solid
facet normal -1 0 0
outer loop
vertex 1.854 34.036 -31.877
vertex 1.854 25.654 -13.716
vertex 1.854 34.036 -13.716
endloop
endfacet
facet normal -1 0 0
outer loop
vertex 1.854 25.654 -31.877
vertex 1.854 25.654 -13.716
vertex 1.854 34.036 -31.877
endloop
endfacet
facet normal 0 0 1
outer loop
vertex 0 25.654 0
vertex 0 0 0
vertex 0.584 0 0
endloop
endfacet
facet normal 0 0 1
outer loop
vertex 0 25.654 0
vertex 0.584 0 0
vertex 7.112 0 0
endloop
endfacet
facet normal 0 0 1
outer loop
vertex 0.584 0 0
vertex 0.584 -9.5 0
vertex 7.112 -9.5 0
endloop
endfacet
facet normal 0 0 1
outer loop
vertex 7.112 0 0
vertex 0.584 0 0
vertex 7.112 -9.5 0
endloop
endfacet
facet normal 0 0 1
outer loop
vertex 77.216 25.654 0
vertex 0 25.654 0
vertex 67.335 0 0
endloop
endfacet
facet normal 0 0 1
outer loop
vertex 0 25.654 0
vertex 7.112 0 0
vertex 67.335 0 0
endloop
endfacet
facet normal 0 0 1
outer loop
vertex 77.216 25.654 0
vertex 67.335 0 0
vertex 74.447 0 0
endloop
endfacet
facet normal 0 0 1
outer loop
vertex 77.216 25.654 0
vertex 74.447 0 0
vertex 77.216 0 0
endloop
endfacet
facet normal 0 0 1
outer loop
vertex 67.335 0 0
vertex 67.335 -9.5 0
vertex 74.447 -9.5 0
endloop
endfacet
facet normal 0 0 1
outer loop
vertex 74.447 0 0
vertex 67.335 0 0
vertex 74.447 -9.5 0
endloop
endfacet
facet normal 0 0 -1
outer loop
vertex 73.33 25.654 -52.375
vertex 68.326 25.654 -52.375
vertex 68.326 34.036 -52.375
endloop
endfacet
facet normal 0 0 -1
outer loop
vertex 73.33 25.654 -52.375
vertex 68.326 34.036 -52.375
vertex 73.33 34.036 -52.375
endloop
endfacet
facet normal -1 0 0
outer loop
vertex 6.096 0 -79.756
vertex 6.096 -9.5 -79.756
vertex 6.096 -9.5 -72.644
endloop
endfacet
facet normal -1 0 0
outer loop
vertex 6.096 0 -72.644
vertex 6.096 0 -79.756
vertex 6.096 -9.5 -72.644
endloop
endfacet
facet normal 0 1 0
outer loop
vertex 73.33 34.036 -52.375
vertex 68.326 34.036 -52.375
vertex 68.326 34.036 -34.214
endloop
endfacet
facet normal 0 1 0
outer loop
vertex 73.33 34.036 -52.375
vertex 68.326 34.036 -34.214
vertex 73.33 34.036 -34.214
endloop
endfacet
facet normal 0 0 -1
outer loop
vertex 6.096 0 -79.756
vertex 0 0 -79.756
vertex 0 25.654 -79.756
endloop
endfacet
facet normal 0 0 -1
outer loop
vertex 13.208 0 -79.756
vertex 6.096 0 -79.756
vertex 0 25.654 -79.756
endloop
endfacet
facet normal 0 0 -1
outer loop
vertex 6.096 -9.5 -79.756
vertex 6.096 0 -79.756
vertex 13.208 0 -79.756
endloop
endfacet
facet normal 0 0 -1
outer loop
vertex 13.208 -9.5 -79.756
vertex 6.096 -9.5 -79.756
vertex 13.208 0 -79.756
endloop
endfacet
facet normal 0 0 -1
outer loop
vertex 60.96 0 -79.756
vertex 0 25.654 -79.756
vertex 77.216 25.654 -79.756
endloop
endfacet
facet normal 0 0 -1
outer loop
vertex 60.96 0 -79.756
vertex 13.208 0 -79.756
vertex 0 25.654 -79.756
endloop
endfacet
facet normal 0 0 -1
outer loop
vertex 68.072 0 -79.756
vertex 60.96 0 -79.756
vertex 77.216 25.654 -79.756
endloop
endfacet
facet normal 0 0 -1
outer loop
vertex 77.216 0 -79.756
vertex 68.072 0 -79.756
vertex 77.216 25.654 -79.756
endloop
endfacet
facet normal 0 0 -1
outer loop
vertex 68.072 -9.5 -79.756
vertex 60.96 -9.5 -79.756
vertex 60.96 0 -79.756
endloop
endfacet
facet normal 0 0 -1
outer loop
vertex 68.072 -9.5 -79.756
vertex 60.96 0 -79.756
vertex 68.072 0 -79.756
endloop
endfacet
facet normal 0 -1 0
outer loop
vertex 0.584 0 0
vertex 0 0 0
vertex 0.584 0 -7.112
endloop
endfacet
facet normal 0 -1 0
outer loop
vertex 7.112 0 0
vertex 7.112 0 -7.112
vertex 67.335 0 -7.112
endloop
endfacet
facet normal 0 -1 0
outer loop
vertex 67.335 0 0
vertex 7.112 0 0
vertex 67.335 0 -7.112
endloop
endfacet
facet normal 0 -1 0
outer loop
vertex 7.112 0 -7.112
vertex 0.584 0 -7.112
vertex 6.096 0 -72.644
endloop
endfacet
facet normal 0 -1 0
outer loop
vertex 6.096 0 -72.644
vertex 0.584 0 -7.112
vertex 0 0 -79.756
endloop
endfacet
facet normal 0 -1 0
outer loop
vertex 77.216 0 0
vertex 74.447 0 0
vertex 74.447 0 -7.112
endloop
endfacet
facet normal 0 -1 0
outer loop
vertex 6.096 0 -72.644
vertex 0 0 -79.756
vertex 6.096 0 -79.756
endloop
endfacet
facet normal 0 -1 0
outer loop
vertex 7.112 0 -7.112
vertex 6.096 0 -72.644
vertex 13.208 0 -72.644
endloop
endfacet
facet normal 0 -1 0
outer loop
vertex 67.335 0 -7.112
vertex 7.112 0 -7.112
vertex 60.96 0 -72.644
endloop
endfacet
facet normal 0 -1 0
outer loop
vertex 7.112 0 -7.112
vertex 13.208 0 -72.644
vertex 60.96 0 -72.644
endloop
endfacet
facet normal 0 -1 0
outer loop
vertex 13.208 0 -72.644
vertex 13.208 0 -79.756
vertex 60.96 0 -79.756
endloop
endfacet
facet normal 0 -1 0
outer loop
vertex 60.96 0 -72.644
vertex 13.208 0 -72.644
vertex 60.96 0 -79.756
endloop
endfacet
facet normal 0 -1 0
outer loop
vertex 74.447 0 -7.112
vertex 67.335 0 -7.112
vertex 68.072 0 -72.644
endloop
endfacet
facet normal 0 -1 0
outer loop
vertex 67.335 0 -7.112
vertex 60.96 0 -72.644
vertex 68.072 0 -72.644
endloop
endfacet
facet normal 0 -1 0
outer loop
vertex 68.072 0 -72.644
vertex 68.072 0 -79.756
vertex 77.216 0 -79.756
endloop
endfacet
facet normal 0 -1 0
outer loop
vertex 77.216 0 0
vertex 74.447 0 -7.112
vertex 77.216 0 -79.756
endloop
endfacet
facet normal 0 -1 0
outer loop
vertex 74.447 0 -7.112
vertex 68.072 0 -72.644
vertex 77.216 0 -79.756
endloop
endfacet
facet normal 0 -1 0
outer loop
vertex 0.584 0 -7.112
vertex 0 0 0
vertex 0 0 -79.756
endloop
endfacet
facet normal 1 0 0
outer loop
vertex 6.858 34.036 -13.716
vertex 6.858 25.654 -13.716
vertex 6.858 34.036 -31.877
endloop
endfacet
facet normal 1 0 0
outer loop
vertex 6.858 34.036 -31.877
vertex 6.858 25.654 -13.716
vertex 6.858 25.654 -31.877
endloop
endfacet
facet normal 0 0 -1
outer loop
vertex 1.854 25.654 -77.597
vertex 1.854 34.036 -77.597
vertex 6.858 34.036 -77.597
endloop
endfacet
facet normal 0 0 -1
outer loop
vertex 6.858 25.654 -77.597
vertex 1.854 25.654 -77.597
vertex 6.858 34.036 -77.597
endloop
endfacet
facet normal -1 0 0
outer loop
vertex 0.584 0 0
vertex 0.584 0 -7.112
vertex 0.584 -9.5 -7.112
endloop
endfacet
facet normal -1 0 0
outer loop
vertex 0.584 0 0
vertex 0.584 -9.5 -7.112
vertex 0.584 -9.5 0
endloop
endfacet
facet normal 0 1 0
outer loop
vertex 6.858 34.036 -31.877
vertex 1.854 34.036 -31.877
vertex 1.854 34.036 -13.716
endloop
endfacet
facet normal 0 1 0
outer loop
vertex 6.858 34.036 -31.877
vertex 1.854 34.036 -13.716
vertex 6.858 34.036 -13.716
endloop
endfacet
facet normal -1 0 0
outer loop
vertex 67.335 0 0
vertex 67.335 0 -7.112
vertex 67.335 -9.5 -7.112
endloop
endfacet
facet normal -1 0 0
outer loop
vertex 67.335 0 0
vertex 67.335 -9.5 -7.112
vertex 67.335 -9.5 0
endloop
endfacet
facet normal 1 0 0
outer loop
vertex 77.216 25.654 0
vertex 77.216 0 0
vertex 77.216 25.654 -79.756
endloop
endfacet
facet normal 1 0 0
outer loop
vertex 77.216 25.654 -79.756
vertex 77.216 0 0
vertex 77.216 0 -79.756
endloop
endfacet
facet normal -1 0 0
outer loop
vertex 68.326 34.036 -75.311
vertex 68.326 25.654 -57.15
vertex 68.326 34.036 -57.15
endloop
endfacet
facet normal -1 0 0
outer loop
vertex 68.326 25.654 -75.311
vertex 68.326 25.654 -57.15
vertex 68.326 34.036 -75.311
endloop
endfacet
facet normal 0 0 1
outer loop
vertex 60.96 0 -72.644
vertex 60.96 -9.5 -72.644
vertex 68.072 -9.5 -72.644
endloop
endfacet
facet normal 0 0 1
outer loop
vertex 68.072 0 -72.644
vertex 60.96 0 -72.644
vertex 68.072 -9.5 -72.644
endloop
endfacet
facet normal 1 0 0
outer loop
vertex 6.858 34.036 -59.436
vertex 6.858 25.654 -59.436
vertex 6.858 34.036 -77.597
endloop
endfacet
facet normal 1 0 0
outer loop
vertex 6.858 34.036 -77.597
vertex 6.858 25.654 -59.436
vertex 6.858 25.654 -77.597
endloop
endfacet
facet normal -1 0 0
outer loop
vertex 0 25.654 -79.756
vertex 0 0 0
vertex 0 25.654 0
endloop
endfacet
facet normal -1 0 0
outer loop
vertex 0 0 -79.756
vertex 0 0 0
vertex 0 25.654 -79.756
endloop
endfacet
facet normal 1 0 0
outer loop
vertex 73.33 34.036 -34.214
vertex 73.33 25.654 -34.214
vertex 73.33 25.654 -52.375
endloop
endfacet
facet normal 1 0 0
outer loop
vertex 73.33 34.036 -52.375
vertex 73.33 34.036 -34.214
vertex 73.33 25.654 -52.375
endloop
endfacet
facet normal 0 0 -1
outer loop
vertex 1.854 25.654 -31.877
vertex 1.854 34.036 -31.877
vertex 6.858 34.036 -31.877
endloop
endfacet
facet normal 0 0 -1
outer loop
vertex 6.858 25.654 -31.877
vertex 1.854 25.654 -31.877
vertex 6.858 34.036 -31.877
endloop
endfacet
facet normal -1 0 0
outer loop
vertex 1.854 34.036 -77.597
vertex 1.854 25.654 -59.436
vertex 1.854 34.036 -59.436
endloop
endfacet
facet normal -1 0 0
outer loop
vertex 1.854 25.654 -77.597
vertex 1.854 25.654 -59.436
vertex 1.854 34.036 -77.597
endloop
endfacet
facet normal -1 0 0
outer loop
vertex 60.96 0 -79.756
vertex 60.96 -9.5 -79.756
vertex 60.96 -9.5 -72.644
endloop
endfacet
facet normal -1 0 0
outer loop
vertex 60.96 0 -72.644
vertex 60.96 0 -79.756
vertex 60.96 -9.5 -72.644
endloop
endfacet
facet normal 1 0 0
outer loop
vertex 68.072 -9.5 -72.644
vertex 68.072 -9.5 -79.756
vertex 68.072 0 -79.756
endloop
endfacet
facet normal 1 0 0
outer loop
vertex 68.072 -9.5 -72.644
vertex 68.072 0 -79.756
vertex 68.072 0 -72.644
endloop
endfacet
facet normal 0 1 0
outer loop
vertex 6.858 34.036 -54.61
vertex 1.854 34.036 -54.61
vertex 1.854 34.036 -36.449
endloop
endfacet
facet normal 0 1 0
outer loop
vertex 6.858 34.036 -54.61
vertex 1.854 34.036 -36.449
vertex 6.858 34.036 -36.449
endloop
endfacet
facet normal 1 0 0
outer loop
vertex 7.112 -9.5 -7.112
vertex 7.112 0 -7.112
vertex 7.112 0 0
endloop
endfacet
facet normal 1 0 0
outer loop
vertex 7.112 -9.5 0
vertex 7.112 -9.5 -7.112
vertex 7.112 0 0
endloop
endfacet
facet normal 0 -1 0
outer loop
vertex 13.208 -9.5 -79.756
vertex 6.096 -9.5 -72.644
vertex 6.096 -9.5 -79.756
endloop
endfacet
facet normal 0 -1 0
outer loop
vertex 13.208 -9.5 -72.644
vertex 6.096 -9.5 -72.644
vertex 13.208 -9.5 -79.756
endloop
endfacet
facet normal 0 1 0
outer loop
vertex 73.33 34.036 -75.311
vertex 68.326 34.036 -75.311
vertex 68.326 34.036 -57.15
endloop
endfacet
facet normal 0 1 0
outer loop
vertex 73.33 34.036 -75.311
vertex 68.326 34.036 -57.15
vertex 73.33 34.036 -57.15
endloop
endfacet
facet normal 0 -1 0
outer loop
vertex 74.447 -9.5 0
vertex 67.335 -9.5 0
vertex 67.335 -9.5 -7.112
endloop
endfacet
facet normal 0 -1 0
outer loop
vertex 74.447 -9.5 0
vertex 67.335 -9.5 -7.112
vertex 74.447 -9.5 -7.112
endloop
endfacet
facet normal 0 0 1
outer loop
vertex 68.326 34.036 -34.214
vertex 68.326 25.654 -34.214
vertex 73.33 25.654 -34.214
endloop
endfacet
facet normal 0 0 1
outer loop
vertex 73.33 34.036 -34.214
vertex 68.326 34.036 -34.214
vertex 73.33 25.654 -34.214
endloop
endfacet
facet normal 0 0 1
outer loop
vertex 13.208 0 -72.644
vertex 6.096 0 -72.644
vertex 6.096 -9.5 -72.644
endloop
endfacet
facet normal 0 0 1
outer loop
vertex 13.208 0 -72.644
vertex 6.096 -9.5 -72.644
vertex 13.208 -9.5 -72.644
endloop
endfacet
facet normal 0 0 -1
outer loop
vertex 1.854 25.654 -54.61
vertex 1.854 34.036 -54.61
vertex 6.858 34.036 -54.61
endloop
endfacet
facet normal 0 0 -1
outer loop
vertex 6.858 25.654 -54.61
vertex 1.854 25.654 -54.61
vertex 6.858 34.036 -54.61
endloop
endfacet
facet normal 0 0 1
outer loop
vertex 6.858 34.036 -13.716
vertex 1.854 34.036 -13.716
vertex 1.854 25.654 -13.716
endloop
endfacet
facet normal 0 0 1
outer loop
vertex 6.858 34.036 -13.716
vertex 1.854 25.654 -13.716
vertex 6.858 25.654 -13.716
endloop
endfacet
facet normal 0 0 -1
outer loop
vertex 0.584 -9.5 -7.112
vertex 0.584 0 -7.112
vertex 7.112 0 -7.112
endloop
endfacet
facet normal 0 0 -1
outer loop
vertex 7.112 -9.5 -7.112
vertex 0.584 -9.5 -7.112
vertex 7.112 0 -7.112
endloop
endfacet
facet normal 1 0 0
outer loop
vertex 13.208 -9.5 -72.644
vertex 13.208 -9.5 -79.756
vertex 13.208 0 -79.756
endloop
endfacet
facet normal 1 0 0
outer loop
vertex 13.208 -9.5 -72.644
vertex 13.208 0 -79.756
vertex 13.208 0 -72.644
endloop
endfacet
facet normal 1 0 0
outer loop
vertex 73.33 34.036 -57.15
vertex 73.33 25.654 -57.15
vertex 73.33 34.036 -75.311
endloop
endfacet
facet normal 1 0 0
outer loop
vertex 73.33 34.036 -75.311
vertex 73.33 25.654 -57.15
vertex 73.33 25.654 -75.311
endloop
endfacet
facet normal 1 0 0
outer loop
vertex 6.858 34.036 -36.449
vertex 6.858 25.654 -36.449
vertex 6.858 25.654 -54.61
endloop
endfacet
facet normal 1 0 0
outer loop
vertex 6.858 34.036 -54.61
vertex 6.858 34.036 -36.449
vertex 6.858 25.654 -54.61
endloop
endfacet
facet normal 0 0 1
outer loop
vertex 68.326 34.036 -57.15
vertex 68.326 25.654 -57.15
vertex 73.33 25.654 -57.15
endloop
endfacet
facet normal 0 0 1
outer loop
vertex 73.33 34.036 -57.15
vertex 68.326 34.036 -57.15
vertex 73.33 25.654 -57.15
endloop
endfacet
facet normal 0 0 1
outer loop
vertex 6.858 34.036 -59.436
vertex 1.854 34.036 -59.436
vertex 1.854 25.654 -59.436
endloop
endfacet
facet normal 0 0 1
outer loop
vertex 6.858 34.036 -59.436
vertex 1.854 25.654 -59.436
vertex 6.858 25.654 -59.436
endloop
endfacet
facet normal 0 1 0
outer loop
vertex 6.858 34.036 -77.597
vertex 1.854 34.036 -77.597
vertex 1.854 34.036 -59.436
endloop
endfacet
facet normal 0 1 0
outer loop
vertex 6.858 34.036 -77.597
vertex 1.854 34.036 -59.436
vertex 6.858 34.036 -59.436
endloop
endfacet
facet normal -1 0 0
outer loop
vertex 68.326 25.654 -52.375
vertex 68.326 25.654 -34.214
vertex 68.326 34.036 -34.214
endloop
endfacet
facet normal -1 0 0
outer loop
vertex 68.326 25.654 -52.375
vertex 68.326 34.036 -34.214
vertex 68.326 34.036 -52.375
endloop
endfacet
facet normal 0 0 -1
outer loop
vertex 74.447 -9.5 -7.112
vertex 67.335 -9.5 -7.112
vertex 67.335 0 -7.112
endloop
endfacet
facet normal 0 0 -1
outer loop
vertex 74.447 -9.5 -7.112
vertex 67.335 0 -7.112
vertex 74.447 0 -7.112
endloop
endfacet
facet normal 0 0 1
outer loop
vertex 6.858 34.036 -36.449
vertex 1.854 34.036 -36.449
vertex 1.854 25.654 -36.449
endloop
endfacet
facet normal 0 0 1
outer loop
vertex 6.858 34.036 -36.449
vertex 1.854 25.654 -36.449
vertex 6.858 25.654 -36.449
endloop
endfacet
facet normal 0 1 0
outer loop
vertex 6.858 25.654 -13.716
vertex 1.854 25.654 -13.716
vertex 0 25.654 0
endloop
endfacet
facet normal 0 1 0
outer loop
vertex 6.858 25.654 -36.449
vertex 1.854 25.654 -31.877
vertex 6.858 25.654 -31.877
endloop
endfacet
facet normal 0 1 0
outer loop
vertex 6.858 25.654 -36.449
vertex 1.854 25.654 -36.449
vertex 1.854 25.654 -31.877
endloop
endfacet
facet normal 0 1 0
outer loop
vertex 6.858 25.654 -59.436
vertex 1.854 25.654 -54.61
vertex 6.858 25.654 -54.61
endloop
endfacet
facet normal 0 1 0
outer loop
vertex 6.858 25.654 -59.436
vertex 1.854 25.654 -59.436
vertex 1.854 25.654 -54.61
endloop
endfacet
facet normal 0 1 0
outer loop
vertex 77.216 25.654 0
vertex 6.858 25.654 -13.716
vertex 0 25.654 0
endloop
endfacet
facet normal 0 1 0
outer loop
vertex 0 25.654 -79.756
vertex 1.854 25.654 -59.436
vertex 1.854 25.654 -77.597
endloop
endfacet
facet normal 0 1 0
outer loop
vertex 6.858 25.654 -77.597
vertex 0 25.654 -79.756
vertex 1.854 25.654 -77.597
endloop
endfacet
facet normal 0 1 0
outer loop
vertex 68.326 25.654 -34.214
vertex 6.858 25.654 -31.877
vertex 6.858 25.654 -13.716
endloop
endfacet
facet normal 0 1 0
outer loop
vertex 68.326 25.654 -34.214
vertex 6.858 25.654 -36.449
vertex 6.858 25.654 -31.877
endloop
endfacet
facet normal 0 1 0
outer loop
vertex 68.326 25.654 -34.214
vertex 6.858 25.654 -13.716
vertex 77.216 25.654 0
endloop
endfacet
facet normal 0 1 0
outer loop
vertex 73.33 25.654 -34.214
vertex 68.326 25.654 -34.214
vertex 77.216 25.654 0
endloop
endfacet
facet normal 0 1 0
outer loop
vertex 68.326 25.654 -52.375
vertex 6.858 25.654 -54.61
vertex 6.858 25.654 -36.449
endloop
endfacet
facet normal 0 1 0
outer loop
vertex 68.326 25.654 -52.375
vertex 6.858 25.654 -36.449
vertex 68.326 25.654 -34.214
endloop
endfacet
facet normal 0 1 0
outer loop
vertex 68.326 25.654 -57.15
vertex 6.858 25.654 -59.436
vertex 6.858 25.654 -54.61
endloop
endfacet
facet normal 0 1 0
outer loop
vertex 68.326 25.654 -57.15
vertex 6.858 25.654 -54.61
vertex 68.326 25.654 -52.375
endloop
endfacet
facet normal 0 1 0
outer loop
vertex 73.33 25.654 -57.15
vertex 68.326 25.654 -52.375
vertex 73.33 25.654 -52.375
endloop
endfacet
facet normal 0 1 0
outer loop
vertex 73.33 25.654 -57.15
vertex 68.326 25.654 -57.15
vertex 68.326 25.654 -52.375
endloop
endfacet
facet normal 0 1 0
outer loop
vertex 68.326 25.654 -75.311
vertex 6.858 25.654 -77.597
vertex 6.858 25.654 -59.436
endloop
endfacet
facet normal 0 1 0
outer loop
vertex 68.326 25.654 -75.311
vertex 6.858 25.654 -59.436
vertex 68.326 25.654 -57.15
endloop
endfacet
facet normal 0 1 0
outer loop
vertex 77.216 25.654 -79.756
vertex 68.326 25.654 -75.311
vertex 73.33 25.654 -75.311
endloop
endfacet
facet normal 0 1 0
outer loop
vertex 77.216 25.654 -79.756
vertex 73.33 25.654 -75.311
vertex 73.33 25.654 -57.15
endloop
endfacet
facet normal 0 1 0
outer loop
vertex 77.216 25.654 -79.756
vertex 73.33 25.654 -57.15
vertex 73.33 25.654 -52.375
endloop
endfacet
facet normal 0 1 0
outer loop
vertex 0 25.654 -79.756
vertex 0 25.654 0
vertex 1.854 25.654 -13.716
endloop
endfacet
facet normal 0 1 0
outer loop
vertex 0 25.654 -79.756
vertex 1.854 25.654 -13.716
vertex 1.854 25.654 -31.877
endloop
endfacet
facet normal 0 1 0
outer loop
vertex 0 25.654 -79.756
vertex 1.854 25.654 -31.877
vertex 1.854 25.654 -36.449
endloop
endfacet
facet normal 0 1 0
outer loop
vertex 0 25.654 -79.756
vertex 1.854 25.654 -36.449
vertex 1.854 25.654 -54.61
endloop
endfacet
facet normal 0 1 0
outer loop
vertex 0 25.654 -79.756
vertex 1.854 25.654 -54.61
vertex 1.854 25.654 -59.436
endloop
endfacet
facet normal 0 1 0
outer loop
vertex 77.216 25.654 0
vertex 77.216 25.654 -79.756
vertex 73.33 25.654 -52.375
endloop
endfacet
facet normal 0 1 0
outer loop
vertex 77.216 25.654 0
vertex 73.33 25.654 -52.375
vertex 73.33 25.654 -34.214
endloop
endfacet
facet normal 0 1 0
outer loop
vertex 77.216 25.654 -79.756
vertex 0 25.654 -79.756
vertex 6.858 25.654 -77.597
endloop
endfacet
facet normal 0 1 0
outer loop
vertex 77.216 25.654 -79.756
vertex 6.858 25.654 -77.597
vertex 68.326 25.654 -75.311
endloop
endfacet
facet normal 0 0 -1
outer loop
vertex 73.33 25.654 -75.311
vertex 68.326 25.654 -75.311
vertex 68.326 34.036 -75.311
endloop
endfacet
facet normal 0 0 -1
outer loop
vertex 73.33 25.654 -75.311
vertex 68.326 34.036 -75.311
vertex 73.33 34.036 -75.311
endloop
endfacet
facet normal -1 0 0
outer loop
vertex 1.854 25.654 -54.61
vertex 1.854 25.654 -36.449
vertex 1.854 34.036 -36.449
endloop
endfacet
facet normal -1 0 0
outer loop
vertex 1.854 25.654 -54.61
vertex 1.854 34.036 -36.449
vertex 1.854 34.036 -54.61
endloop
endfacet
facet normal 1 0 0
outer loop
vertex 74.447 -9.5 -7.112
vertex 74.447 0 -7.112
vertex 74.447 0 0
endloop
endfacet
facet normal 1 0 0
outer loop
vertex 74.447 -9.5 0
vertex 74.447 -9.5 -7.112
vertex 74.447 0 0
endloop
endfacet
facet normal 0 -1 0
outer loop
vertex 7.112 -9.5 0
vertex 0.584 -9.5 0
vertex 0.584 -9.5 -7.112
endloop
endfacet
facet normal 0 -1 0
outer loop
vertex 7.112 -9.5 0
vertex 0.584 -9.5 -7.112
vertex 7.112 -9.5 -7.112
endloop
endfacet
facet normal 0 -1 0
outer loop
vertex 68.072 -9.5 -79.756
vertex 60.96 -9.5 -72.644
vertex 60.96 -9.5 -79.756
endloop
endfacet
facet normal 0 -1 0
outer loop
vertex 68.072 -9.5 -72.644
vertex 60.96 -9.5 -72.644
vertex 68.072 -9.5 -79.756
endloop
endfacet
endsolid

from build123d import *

# Parameters (mm, degrees)
SKETCH1_W           = 77.216
SKETCH1_H           = 79.756
BASE_DEPTH          = 25.654
SKETCH2_W           = 5.0038
SKETCH2_H           = 18.161
TOP_HEADERS_DEPTH   = 8.382
SKETCH3_W           = 7.112
SKETCH3_H           = 7.112
SKETCH3_W_2         = 6.5278
BOSS_EXTRUDE3_DEPTH = 9.4996


with BuildPart() as part:
    # Sketch1 → Base (new body)
    with BuildSketch(Plane(origin=(0, 0, 0), x_dir=(1, 0, 0), z_dir=(0, 1, 0))):
        with Locations((38.608, 39.878)):
            Rectangle(SKETCH1_W, SKETCH1_H)
    extrude(amount=BASE_DEPTH)

    # Sketch2 → Top Headers (add)
    with BuildSketch(Plane(origin=(0, 25.654, 0), x_dir=(1, 0, 0), z_dir=(0, 1, 0))):
        with Locations((4.3561, 68.5165)):
            Rectangle(SKETCH2_W, SKETCH2_H)
        with Locations((4.3561, 45.5295)):
            Rectangle(SKETCH2_W, SKETCH2_H)
        with Locations((4.3561, 22.7965)):
            Rectangle(SKETCH2_W, SKETCH2_H)
        with Locations((70.8279, 66.2305)):
            Rectangle(SKETCH2_W, SKETCH2_H)
        with Locations((70.8279, 43.2943)):
            Rectangle(SKETCH2_W, SKETCH2_H)
    extrude(amount=TOP_HEADERS_DEPTH)

    # Sketch3 → Boss-Extrude3 (add)
    with BuildSketch(Plane.XZ):
        with Locations((64.516, -76.2)):
            Rectangle(SKETCH3_W, SKETCH3_H)
        with Locations((9.652, -76.2)):
            Rectangle(SKETCH3_W, SKETCH3_H)
        with Locations((3.8481, -3.556)):
            Rectangle(SKETCH3_W_2, SKETCH3_H)
        with Locations((70.8914, -3.556)):
            Rectangle(SKETCH3_W, SKETCH3_H)
    extrude(amount=BOSS_EXTRUDE3_DEPTH)


solid = part.part
